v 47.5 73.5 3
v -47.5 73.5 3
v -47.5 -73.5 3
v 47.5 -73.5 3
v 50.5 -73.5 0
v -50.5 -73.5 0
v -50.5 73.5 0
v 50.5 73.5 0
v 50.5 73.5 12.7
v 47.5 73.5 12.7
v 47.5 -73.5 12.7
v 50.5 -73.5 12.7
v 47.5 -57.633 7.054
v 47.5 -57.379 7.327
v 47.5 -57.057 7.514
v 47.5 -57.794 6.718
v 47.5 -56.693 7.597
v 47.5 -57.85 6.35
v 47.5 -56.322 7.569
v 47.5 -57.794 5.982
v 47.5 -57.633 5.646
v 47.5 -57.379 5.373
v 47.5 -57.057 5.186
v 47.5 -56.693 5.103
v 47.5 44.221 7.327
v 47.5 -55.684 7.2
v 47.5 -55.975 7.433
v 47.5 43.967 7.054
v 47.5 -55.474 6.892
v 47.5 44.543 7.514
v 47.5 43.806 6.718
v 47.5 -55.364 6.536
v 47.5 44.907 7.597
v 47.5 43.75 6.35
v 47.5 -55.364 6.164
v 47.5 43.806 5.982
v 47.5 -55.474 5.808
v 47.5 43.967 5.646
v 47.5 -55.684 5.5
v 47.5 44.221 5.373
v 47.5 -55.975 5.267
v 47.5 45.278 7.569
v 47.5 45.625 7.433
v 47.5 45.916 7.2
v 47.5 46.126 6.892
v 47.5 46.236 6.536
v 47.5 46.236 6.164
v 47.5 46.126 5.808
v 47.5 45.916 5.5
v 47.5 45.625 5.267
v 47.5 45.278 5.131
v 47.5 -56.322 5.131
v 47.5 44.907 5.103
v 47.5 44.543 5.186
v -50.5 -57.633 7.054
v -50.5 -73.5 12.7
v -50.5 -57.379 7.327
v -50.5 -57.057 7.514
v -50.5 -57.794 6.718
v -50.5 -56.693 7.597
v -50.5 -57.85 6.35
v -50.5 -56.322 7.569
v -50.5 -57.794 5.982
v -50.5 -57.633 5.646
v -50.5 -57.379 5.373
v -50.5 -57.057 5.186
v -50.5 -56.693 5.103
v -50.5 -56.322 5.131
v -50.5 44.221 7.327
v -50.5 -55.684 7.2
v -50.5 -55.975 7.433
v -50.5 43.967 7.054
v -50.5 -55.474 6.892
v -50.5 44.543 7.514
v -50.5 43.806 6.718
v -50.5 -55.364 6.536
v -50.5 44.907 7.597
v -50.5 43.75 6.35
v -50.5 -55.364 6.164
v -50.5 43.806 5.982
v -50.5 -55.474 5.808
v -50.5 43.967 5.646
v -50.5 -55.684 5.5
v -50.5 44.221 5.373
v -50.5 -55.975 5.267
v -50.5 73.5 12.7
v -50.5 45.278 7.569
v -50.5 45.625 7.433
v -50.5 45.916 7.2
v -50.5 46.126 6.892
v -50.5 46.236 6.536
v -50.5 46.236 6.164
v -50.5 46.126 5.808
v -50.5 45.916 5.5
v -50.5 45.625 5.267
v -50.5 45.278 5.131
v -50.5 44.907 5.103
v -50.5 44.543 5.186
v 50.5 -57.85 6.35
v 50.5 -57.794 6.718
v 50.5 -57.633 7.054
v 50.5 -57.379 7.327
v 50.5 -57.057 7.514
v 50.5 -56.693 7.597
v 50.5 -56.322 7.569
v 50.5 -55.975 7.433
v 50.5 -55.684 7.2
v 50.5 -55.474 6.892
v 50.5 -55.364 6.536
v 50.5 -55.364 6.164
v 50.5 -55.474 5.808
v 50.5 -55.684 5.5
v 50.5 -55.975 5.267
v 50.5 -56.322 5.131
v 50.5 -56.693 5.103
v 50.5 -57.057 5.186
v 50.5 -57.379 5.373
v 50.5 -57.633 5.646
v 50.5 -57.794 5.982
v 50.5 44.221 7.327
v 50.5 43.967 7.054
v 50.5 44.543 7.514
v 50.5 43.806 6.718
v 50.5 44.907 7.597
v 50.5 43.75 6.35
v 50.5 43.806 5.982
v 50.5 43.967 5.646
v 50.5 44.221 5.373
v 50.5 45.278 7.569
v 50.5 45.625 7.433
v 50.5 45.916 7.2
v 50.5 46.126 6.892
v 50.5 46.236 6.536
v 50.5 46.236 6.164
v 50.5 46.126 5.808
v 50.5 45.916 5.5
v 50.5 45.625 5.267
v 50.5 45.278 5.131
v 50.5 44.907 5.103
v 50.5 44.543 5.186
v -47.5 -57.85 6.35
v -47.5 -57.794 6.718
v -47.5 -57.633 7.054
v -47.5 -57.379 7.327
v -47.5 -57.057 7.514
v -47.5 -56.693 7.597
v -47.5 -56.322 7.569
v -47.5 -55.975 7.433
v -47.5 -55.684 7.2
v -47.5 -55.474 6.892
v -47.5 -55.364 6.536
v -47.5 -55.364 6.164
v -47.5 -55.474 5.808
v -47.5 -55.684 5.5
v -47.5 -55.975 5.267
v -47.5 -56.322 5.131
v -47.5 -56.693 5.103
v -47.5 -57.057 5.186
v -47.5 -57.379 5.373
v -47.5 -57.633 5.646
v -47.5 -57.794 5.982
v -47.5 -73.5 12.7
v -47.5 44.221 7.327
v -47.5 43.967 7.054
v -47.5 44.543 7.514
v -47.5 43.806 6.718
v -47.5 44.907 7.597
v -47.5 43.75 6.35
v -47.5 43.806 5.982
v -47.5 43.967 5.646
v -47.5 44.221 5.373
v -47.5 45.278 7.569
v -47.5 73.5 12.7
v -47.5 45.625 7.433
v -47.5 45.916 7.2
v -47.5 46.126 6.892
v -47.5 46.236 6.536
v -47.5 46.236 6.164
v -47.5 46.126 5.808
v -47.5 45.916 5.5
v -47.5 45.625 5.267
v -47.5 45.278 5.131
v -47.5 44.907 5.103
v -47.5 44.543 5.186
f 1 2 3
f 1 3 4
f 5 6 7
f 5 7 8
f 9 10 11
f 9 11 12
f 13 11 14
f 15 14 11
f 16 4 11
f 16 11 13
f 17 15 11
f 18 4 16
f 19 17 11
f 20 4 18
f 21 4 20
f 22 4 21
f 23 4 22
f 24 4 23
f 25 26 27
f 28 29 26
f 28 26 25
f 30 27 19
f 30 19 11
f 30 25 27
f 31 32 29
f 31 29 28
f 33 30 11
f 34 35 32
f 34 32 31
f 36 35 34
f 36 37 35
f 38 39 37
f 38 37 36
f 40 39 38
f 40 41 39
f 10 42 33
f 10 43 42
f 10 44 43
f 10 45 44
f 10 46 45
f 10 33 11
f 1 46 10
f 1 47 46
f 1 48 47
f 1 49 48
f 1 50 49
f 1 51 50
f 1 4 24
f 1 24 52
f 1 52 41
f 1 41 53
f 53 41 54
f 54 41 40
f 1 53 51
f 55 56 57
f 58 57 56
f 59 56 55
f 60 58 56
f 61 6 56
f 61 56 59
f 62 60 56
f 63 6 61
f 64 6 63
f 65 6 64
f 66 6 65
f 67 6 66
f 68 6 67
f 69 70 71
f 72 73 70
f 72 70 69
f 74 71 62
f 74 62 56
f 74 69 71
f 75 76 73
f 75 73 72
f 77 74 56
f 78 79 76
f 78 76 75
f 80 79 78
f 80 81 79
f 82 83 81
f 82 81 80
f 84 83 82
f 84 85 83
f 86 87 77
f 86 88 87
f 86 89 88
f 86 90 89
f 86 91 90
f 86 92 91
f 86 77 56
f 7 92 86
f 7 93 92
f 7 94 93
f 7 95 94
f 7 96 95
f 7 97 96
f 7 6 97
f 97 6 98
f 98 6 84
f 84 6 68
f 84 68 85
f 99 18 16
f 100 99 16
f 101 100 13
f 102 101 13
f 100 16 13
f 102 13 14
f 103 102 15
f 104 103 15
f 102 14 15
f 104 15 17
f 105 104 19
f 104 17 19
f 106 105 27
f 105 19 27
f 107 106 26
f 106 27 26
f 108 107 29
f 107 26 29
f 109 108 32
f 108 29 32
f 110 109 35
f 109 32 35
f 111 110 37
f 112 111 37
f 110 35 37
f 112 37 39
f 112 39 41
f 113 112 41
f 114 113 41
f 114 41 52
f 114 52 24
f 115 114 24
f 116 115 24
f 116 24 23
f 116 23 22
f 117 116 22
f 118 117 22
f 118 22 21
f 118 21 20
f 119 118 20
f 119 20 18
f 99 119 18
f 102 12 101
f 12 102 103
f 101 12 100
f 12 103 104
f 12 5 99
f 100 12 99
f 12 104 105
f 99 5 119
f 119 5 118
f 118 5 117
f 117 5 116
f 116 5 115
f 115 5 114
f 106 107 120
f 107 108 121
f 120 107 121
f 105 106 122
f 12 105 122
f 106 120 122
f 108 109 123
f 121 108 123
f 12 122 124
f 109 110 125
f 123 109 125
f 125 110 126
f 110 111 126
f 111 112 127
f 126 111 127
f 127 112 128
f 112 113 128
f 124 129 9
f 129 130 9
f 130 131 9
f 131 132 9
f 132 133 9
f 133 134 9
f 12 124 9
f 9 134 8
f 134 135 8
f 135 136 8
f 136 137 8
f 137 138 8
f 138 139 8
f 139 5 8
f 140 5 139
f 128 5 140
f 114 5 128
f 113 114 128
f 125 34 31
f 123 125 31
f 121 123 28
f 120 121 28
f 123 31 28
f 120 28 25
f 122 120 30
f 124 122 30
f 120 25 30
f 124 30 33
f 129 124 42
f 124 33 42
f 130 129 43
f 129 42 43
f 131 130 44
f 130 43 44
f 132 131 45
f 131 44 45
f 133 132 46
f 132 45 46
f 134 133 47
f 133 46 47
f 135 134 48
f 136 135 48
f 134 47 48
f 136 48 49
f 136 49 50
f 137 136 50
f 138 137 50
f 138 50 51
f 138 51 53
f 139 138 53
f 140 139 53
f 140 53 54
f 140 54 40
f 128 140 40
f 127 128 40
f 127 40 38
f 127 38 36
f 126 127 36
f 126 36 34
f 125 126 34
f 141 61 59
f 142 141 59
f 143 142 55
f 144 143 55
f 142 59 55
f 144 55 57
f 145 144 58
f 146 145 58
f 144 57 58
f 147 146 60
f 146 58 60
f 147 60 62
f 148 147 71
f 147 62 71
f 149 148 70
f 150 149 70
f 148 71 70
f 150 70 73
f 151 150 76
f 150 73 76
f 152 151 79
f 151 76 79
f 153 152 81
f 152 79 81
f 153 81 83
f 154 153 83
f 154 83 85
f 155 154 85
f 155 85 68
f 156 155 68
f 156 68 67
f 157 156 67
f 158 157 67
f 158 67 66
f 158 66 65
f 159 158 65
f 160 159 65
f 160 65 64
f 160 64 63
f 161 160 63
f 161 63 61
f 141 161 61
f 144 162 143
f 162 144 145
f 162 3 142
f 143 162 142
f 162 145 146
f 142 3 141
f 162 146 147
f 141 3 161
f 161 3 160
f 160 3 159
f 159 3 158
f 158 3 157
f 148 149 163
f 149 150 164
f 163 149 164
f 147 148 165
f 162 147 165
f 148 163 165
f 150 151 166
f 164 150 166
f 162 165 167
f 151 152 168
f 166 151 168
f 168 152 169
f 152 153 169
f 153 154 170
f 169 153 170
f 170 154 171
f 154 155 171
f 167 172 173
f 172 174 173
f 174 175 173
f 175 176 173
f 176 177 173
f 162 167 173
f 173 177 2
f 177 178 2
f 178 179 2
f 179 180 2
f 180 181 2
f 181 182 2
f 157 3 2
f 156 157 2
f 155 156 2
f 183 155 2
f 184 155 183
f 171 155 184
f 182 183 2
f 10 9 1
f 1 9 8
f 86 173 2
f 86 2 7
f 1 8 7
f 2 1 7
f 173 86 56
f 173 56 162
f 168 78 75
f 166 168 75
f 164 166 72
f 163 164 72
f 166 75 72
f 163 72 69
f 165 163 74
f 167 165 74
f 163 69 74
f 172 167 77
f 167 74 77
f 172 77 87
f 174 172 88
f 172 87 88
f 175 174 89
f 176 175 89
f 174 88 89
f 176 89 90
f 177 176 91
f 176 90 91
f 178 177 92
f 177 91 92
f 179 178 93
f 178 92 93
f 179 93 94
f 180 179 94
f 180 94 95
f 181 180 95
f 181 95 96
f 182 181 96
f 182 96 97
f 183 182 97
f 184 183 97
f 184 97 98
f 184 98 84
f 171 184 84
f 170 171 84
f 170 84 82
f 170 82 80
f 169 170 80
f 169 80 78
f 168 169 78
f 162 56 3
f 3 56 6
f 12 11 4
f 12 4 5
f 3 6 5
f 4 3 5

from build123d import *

# Parameters (mm, degrees)
F1_W     = 3
F1_H     = 147
F1_W_2   = 95
F2_DEPTH = 3
F3_DEPTH = 12.7
F4_R     = 1.25
F5_DEPTH = 101.001


with BuildPart() as f2:
    # F1 (on Top) → F2 (new body)
    with BuildSketch(Plane.XY):
        with Locations((-49, 0)):
            Rectangle(F1_W, F1_H)
        Rectangle(F1_W_2, F1_H)
        with Locations((49, 0)):
            Rectangle(F1_W, F1_H)
    extrude(amount=F2_DEPTH)

    # F1 (on Top) → F3 (join)
    with BuildSketch(Plane.XY):
        with Locations((-49, 0)):
            Rectangle(F1_W, F1_H)
        with Locations((49, 0)):
            Rectangle(F1_W, F1_H)
    extrude(amount=F3_DEPTH)

    # F4 (on face) → F5 (cut, through all)
    with BuildSketch(Plane(origin=(-50.5, 0, 0), x_dir=(0, -1, 0), z_dir=(-1, 0, 0))):
        with Locations((-45, 6.35)):
            Circle(F4_R)
        with Locations((56.6, 6.35)):
            Circle(F4_R)
    extrude(amount=-F5_DEPTH, mode=Mode.SUBTRACT)


solid = f2.part
